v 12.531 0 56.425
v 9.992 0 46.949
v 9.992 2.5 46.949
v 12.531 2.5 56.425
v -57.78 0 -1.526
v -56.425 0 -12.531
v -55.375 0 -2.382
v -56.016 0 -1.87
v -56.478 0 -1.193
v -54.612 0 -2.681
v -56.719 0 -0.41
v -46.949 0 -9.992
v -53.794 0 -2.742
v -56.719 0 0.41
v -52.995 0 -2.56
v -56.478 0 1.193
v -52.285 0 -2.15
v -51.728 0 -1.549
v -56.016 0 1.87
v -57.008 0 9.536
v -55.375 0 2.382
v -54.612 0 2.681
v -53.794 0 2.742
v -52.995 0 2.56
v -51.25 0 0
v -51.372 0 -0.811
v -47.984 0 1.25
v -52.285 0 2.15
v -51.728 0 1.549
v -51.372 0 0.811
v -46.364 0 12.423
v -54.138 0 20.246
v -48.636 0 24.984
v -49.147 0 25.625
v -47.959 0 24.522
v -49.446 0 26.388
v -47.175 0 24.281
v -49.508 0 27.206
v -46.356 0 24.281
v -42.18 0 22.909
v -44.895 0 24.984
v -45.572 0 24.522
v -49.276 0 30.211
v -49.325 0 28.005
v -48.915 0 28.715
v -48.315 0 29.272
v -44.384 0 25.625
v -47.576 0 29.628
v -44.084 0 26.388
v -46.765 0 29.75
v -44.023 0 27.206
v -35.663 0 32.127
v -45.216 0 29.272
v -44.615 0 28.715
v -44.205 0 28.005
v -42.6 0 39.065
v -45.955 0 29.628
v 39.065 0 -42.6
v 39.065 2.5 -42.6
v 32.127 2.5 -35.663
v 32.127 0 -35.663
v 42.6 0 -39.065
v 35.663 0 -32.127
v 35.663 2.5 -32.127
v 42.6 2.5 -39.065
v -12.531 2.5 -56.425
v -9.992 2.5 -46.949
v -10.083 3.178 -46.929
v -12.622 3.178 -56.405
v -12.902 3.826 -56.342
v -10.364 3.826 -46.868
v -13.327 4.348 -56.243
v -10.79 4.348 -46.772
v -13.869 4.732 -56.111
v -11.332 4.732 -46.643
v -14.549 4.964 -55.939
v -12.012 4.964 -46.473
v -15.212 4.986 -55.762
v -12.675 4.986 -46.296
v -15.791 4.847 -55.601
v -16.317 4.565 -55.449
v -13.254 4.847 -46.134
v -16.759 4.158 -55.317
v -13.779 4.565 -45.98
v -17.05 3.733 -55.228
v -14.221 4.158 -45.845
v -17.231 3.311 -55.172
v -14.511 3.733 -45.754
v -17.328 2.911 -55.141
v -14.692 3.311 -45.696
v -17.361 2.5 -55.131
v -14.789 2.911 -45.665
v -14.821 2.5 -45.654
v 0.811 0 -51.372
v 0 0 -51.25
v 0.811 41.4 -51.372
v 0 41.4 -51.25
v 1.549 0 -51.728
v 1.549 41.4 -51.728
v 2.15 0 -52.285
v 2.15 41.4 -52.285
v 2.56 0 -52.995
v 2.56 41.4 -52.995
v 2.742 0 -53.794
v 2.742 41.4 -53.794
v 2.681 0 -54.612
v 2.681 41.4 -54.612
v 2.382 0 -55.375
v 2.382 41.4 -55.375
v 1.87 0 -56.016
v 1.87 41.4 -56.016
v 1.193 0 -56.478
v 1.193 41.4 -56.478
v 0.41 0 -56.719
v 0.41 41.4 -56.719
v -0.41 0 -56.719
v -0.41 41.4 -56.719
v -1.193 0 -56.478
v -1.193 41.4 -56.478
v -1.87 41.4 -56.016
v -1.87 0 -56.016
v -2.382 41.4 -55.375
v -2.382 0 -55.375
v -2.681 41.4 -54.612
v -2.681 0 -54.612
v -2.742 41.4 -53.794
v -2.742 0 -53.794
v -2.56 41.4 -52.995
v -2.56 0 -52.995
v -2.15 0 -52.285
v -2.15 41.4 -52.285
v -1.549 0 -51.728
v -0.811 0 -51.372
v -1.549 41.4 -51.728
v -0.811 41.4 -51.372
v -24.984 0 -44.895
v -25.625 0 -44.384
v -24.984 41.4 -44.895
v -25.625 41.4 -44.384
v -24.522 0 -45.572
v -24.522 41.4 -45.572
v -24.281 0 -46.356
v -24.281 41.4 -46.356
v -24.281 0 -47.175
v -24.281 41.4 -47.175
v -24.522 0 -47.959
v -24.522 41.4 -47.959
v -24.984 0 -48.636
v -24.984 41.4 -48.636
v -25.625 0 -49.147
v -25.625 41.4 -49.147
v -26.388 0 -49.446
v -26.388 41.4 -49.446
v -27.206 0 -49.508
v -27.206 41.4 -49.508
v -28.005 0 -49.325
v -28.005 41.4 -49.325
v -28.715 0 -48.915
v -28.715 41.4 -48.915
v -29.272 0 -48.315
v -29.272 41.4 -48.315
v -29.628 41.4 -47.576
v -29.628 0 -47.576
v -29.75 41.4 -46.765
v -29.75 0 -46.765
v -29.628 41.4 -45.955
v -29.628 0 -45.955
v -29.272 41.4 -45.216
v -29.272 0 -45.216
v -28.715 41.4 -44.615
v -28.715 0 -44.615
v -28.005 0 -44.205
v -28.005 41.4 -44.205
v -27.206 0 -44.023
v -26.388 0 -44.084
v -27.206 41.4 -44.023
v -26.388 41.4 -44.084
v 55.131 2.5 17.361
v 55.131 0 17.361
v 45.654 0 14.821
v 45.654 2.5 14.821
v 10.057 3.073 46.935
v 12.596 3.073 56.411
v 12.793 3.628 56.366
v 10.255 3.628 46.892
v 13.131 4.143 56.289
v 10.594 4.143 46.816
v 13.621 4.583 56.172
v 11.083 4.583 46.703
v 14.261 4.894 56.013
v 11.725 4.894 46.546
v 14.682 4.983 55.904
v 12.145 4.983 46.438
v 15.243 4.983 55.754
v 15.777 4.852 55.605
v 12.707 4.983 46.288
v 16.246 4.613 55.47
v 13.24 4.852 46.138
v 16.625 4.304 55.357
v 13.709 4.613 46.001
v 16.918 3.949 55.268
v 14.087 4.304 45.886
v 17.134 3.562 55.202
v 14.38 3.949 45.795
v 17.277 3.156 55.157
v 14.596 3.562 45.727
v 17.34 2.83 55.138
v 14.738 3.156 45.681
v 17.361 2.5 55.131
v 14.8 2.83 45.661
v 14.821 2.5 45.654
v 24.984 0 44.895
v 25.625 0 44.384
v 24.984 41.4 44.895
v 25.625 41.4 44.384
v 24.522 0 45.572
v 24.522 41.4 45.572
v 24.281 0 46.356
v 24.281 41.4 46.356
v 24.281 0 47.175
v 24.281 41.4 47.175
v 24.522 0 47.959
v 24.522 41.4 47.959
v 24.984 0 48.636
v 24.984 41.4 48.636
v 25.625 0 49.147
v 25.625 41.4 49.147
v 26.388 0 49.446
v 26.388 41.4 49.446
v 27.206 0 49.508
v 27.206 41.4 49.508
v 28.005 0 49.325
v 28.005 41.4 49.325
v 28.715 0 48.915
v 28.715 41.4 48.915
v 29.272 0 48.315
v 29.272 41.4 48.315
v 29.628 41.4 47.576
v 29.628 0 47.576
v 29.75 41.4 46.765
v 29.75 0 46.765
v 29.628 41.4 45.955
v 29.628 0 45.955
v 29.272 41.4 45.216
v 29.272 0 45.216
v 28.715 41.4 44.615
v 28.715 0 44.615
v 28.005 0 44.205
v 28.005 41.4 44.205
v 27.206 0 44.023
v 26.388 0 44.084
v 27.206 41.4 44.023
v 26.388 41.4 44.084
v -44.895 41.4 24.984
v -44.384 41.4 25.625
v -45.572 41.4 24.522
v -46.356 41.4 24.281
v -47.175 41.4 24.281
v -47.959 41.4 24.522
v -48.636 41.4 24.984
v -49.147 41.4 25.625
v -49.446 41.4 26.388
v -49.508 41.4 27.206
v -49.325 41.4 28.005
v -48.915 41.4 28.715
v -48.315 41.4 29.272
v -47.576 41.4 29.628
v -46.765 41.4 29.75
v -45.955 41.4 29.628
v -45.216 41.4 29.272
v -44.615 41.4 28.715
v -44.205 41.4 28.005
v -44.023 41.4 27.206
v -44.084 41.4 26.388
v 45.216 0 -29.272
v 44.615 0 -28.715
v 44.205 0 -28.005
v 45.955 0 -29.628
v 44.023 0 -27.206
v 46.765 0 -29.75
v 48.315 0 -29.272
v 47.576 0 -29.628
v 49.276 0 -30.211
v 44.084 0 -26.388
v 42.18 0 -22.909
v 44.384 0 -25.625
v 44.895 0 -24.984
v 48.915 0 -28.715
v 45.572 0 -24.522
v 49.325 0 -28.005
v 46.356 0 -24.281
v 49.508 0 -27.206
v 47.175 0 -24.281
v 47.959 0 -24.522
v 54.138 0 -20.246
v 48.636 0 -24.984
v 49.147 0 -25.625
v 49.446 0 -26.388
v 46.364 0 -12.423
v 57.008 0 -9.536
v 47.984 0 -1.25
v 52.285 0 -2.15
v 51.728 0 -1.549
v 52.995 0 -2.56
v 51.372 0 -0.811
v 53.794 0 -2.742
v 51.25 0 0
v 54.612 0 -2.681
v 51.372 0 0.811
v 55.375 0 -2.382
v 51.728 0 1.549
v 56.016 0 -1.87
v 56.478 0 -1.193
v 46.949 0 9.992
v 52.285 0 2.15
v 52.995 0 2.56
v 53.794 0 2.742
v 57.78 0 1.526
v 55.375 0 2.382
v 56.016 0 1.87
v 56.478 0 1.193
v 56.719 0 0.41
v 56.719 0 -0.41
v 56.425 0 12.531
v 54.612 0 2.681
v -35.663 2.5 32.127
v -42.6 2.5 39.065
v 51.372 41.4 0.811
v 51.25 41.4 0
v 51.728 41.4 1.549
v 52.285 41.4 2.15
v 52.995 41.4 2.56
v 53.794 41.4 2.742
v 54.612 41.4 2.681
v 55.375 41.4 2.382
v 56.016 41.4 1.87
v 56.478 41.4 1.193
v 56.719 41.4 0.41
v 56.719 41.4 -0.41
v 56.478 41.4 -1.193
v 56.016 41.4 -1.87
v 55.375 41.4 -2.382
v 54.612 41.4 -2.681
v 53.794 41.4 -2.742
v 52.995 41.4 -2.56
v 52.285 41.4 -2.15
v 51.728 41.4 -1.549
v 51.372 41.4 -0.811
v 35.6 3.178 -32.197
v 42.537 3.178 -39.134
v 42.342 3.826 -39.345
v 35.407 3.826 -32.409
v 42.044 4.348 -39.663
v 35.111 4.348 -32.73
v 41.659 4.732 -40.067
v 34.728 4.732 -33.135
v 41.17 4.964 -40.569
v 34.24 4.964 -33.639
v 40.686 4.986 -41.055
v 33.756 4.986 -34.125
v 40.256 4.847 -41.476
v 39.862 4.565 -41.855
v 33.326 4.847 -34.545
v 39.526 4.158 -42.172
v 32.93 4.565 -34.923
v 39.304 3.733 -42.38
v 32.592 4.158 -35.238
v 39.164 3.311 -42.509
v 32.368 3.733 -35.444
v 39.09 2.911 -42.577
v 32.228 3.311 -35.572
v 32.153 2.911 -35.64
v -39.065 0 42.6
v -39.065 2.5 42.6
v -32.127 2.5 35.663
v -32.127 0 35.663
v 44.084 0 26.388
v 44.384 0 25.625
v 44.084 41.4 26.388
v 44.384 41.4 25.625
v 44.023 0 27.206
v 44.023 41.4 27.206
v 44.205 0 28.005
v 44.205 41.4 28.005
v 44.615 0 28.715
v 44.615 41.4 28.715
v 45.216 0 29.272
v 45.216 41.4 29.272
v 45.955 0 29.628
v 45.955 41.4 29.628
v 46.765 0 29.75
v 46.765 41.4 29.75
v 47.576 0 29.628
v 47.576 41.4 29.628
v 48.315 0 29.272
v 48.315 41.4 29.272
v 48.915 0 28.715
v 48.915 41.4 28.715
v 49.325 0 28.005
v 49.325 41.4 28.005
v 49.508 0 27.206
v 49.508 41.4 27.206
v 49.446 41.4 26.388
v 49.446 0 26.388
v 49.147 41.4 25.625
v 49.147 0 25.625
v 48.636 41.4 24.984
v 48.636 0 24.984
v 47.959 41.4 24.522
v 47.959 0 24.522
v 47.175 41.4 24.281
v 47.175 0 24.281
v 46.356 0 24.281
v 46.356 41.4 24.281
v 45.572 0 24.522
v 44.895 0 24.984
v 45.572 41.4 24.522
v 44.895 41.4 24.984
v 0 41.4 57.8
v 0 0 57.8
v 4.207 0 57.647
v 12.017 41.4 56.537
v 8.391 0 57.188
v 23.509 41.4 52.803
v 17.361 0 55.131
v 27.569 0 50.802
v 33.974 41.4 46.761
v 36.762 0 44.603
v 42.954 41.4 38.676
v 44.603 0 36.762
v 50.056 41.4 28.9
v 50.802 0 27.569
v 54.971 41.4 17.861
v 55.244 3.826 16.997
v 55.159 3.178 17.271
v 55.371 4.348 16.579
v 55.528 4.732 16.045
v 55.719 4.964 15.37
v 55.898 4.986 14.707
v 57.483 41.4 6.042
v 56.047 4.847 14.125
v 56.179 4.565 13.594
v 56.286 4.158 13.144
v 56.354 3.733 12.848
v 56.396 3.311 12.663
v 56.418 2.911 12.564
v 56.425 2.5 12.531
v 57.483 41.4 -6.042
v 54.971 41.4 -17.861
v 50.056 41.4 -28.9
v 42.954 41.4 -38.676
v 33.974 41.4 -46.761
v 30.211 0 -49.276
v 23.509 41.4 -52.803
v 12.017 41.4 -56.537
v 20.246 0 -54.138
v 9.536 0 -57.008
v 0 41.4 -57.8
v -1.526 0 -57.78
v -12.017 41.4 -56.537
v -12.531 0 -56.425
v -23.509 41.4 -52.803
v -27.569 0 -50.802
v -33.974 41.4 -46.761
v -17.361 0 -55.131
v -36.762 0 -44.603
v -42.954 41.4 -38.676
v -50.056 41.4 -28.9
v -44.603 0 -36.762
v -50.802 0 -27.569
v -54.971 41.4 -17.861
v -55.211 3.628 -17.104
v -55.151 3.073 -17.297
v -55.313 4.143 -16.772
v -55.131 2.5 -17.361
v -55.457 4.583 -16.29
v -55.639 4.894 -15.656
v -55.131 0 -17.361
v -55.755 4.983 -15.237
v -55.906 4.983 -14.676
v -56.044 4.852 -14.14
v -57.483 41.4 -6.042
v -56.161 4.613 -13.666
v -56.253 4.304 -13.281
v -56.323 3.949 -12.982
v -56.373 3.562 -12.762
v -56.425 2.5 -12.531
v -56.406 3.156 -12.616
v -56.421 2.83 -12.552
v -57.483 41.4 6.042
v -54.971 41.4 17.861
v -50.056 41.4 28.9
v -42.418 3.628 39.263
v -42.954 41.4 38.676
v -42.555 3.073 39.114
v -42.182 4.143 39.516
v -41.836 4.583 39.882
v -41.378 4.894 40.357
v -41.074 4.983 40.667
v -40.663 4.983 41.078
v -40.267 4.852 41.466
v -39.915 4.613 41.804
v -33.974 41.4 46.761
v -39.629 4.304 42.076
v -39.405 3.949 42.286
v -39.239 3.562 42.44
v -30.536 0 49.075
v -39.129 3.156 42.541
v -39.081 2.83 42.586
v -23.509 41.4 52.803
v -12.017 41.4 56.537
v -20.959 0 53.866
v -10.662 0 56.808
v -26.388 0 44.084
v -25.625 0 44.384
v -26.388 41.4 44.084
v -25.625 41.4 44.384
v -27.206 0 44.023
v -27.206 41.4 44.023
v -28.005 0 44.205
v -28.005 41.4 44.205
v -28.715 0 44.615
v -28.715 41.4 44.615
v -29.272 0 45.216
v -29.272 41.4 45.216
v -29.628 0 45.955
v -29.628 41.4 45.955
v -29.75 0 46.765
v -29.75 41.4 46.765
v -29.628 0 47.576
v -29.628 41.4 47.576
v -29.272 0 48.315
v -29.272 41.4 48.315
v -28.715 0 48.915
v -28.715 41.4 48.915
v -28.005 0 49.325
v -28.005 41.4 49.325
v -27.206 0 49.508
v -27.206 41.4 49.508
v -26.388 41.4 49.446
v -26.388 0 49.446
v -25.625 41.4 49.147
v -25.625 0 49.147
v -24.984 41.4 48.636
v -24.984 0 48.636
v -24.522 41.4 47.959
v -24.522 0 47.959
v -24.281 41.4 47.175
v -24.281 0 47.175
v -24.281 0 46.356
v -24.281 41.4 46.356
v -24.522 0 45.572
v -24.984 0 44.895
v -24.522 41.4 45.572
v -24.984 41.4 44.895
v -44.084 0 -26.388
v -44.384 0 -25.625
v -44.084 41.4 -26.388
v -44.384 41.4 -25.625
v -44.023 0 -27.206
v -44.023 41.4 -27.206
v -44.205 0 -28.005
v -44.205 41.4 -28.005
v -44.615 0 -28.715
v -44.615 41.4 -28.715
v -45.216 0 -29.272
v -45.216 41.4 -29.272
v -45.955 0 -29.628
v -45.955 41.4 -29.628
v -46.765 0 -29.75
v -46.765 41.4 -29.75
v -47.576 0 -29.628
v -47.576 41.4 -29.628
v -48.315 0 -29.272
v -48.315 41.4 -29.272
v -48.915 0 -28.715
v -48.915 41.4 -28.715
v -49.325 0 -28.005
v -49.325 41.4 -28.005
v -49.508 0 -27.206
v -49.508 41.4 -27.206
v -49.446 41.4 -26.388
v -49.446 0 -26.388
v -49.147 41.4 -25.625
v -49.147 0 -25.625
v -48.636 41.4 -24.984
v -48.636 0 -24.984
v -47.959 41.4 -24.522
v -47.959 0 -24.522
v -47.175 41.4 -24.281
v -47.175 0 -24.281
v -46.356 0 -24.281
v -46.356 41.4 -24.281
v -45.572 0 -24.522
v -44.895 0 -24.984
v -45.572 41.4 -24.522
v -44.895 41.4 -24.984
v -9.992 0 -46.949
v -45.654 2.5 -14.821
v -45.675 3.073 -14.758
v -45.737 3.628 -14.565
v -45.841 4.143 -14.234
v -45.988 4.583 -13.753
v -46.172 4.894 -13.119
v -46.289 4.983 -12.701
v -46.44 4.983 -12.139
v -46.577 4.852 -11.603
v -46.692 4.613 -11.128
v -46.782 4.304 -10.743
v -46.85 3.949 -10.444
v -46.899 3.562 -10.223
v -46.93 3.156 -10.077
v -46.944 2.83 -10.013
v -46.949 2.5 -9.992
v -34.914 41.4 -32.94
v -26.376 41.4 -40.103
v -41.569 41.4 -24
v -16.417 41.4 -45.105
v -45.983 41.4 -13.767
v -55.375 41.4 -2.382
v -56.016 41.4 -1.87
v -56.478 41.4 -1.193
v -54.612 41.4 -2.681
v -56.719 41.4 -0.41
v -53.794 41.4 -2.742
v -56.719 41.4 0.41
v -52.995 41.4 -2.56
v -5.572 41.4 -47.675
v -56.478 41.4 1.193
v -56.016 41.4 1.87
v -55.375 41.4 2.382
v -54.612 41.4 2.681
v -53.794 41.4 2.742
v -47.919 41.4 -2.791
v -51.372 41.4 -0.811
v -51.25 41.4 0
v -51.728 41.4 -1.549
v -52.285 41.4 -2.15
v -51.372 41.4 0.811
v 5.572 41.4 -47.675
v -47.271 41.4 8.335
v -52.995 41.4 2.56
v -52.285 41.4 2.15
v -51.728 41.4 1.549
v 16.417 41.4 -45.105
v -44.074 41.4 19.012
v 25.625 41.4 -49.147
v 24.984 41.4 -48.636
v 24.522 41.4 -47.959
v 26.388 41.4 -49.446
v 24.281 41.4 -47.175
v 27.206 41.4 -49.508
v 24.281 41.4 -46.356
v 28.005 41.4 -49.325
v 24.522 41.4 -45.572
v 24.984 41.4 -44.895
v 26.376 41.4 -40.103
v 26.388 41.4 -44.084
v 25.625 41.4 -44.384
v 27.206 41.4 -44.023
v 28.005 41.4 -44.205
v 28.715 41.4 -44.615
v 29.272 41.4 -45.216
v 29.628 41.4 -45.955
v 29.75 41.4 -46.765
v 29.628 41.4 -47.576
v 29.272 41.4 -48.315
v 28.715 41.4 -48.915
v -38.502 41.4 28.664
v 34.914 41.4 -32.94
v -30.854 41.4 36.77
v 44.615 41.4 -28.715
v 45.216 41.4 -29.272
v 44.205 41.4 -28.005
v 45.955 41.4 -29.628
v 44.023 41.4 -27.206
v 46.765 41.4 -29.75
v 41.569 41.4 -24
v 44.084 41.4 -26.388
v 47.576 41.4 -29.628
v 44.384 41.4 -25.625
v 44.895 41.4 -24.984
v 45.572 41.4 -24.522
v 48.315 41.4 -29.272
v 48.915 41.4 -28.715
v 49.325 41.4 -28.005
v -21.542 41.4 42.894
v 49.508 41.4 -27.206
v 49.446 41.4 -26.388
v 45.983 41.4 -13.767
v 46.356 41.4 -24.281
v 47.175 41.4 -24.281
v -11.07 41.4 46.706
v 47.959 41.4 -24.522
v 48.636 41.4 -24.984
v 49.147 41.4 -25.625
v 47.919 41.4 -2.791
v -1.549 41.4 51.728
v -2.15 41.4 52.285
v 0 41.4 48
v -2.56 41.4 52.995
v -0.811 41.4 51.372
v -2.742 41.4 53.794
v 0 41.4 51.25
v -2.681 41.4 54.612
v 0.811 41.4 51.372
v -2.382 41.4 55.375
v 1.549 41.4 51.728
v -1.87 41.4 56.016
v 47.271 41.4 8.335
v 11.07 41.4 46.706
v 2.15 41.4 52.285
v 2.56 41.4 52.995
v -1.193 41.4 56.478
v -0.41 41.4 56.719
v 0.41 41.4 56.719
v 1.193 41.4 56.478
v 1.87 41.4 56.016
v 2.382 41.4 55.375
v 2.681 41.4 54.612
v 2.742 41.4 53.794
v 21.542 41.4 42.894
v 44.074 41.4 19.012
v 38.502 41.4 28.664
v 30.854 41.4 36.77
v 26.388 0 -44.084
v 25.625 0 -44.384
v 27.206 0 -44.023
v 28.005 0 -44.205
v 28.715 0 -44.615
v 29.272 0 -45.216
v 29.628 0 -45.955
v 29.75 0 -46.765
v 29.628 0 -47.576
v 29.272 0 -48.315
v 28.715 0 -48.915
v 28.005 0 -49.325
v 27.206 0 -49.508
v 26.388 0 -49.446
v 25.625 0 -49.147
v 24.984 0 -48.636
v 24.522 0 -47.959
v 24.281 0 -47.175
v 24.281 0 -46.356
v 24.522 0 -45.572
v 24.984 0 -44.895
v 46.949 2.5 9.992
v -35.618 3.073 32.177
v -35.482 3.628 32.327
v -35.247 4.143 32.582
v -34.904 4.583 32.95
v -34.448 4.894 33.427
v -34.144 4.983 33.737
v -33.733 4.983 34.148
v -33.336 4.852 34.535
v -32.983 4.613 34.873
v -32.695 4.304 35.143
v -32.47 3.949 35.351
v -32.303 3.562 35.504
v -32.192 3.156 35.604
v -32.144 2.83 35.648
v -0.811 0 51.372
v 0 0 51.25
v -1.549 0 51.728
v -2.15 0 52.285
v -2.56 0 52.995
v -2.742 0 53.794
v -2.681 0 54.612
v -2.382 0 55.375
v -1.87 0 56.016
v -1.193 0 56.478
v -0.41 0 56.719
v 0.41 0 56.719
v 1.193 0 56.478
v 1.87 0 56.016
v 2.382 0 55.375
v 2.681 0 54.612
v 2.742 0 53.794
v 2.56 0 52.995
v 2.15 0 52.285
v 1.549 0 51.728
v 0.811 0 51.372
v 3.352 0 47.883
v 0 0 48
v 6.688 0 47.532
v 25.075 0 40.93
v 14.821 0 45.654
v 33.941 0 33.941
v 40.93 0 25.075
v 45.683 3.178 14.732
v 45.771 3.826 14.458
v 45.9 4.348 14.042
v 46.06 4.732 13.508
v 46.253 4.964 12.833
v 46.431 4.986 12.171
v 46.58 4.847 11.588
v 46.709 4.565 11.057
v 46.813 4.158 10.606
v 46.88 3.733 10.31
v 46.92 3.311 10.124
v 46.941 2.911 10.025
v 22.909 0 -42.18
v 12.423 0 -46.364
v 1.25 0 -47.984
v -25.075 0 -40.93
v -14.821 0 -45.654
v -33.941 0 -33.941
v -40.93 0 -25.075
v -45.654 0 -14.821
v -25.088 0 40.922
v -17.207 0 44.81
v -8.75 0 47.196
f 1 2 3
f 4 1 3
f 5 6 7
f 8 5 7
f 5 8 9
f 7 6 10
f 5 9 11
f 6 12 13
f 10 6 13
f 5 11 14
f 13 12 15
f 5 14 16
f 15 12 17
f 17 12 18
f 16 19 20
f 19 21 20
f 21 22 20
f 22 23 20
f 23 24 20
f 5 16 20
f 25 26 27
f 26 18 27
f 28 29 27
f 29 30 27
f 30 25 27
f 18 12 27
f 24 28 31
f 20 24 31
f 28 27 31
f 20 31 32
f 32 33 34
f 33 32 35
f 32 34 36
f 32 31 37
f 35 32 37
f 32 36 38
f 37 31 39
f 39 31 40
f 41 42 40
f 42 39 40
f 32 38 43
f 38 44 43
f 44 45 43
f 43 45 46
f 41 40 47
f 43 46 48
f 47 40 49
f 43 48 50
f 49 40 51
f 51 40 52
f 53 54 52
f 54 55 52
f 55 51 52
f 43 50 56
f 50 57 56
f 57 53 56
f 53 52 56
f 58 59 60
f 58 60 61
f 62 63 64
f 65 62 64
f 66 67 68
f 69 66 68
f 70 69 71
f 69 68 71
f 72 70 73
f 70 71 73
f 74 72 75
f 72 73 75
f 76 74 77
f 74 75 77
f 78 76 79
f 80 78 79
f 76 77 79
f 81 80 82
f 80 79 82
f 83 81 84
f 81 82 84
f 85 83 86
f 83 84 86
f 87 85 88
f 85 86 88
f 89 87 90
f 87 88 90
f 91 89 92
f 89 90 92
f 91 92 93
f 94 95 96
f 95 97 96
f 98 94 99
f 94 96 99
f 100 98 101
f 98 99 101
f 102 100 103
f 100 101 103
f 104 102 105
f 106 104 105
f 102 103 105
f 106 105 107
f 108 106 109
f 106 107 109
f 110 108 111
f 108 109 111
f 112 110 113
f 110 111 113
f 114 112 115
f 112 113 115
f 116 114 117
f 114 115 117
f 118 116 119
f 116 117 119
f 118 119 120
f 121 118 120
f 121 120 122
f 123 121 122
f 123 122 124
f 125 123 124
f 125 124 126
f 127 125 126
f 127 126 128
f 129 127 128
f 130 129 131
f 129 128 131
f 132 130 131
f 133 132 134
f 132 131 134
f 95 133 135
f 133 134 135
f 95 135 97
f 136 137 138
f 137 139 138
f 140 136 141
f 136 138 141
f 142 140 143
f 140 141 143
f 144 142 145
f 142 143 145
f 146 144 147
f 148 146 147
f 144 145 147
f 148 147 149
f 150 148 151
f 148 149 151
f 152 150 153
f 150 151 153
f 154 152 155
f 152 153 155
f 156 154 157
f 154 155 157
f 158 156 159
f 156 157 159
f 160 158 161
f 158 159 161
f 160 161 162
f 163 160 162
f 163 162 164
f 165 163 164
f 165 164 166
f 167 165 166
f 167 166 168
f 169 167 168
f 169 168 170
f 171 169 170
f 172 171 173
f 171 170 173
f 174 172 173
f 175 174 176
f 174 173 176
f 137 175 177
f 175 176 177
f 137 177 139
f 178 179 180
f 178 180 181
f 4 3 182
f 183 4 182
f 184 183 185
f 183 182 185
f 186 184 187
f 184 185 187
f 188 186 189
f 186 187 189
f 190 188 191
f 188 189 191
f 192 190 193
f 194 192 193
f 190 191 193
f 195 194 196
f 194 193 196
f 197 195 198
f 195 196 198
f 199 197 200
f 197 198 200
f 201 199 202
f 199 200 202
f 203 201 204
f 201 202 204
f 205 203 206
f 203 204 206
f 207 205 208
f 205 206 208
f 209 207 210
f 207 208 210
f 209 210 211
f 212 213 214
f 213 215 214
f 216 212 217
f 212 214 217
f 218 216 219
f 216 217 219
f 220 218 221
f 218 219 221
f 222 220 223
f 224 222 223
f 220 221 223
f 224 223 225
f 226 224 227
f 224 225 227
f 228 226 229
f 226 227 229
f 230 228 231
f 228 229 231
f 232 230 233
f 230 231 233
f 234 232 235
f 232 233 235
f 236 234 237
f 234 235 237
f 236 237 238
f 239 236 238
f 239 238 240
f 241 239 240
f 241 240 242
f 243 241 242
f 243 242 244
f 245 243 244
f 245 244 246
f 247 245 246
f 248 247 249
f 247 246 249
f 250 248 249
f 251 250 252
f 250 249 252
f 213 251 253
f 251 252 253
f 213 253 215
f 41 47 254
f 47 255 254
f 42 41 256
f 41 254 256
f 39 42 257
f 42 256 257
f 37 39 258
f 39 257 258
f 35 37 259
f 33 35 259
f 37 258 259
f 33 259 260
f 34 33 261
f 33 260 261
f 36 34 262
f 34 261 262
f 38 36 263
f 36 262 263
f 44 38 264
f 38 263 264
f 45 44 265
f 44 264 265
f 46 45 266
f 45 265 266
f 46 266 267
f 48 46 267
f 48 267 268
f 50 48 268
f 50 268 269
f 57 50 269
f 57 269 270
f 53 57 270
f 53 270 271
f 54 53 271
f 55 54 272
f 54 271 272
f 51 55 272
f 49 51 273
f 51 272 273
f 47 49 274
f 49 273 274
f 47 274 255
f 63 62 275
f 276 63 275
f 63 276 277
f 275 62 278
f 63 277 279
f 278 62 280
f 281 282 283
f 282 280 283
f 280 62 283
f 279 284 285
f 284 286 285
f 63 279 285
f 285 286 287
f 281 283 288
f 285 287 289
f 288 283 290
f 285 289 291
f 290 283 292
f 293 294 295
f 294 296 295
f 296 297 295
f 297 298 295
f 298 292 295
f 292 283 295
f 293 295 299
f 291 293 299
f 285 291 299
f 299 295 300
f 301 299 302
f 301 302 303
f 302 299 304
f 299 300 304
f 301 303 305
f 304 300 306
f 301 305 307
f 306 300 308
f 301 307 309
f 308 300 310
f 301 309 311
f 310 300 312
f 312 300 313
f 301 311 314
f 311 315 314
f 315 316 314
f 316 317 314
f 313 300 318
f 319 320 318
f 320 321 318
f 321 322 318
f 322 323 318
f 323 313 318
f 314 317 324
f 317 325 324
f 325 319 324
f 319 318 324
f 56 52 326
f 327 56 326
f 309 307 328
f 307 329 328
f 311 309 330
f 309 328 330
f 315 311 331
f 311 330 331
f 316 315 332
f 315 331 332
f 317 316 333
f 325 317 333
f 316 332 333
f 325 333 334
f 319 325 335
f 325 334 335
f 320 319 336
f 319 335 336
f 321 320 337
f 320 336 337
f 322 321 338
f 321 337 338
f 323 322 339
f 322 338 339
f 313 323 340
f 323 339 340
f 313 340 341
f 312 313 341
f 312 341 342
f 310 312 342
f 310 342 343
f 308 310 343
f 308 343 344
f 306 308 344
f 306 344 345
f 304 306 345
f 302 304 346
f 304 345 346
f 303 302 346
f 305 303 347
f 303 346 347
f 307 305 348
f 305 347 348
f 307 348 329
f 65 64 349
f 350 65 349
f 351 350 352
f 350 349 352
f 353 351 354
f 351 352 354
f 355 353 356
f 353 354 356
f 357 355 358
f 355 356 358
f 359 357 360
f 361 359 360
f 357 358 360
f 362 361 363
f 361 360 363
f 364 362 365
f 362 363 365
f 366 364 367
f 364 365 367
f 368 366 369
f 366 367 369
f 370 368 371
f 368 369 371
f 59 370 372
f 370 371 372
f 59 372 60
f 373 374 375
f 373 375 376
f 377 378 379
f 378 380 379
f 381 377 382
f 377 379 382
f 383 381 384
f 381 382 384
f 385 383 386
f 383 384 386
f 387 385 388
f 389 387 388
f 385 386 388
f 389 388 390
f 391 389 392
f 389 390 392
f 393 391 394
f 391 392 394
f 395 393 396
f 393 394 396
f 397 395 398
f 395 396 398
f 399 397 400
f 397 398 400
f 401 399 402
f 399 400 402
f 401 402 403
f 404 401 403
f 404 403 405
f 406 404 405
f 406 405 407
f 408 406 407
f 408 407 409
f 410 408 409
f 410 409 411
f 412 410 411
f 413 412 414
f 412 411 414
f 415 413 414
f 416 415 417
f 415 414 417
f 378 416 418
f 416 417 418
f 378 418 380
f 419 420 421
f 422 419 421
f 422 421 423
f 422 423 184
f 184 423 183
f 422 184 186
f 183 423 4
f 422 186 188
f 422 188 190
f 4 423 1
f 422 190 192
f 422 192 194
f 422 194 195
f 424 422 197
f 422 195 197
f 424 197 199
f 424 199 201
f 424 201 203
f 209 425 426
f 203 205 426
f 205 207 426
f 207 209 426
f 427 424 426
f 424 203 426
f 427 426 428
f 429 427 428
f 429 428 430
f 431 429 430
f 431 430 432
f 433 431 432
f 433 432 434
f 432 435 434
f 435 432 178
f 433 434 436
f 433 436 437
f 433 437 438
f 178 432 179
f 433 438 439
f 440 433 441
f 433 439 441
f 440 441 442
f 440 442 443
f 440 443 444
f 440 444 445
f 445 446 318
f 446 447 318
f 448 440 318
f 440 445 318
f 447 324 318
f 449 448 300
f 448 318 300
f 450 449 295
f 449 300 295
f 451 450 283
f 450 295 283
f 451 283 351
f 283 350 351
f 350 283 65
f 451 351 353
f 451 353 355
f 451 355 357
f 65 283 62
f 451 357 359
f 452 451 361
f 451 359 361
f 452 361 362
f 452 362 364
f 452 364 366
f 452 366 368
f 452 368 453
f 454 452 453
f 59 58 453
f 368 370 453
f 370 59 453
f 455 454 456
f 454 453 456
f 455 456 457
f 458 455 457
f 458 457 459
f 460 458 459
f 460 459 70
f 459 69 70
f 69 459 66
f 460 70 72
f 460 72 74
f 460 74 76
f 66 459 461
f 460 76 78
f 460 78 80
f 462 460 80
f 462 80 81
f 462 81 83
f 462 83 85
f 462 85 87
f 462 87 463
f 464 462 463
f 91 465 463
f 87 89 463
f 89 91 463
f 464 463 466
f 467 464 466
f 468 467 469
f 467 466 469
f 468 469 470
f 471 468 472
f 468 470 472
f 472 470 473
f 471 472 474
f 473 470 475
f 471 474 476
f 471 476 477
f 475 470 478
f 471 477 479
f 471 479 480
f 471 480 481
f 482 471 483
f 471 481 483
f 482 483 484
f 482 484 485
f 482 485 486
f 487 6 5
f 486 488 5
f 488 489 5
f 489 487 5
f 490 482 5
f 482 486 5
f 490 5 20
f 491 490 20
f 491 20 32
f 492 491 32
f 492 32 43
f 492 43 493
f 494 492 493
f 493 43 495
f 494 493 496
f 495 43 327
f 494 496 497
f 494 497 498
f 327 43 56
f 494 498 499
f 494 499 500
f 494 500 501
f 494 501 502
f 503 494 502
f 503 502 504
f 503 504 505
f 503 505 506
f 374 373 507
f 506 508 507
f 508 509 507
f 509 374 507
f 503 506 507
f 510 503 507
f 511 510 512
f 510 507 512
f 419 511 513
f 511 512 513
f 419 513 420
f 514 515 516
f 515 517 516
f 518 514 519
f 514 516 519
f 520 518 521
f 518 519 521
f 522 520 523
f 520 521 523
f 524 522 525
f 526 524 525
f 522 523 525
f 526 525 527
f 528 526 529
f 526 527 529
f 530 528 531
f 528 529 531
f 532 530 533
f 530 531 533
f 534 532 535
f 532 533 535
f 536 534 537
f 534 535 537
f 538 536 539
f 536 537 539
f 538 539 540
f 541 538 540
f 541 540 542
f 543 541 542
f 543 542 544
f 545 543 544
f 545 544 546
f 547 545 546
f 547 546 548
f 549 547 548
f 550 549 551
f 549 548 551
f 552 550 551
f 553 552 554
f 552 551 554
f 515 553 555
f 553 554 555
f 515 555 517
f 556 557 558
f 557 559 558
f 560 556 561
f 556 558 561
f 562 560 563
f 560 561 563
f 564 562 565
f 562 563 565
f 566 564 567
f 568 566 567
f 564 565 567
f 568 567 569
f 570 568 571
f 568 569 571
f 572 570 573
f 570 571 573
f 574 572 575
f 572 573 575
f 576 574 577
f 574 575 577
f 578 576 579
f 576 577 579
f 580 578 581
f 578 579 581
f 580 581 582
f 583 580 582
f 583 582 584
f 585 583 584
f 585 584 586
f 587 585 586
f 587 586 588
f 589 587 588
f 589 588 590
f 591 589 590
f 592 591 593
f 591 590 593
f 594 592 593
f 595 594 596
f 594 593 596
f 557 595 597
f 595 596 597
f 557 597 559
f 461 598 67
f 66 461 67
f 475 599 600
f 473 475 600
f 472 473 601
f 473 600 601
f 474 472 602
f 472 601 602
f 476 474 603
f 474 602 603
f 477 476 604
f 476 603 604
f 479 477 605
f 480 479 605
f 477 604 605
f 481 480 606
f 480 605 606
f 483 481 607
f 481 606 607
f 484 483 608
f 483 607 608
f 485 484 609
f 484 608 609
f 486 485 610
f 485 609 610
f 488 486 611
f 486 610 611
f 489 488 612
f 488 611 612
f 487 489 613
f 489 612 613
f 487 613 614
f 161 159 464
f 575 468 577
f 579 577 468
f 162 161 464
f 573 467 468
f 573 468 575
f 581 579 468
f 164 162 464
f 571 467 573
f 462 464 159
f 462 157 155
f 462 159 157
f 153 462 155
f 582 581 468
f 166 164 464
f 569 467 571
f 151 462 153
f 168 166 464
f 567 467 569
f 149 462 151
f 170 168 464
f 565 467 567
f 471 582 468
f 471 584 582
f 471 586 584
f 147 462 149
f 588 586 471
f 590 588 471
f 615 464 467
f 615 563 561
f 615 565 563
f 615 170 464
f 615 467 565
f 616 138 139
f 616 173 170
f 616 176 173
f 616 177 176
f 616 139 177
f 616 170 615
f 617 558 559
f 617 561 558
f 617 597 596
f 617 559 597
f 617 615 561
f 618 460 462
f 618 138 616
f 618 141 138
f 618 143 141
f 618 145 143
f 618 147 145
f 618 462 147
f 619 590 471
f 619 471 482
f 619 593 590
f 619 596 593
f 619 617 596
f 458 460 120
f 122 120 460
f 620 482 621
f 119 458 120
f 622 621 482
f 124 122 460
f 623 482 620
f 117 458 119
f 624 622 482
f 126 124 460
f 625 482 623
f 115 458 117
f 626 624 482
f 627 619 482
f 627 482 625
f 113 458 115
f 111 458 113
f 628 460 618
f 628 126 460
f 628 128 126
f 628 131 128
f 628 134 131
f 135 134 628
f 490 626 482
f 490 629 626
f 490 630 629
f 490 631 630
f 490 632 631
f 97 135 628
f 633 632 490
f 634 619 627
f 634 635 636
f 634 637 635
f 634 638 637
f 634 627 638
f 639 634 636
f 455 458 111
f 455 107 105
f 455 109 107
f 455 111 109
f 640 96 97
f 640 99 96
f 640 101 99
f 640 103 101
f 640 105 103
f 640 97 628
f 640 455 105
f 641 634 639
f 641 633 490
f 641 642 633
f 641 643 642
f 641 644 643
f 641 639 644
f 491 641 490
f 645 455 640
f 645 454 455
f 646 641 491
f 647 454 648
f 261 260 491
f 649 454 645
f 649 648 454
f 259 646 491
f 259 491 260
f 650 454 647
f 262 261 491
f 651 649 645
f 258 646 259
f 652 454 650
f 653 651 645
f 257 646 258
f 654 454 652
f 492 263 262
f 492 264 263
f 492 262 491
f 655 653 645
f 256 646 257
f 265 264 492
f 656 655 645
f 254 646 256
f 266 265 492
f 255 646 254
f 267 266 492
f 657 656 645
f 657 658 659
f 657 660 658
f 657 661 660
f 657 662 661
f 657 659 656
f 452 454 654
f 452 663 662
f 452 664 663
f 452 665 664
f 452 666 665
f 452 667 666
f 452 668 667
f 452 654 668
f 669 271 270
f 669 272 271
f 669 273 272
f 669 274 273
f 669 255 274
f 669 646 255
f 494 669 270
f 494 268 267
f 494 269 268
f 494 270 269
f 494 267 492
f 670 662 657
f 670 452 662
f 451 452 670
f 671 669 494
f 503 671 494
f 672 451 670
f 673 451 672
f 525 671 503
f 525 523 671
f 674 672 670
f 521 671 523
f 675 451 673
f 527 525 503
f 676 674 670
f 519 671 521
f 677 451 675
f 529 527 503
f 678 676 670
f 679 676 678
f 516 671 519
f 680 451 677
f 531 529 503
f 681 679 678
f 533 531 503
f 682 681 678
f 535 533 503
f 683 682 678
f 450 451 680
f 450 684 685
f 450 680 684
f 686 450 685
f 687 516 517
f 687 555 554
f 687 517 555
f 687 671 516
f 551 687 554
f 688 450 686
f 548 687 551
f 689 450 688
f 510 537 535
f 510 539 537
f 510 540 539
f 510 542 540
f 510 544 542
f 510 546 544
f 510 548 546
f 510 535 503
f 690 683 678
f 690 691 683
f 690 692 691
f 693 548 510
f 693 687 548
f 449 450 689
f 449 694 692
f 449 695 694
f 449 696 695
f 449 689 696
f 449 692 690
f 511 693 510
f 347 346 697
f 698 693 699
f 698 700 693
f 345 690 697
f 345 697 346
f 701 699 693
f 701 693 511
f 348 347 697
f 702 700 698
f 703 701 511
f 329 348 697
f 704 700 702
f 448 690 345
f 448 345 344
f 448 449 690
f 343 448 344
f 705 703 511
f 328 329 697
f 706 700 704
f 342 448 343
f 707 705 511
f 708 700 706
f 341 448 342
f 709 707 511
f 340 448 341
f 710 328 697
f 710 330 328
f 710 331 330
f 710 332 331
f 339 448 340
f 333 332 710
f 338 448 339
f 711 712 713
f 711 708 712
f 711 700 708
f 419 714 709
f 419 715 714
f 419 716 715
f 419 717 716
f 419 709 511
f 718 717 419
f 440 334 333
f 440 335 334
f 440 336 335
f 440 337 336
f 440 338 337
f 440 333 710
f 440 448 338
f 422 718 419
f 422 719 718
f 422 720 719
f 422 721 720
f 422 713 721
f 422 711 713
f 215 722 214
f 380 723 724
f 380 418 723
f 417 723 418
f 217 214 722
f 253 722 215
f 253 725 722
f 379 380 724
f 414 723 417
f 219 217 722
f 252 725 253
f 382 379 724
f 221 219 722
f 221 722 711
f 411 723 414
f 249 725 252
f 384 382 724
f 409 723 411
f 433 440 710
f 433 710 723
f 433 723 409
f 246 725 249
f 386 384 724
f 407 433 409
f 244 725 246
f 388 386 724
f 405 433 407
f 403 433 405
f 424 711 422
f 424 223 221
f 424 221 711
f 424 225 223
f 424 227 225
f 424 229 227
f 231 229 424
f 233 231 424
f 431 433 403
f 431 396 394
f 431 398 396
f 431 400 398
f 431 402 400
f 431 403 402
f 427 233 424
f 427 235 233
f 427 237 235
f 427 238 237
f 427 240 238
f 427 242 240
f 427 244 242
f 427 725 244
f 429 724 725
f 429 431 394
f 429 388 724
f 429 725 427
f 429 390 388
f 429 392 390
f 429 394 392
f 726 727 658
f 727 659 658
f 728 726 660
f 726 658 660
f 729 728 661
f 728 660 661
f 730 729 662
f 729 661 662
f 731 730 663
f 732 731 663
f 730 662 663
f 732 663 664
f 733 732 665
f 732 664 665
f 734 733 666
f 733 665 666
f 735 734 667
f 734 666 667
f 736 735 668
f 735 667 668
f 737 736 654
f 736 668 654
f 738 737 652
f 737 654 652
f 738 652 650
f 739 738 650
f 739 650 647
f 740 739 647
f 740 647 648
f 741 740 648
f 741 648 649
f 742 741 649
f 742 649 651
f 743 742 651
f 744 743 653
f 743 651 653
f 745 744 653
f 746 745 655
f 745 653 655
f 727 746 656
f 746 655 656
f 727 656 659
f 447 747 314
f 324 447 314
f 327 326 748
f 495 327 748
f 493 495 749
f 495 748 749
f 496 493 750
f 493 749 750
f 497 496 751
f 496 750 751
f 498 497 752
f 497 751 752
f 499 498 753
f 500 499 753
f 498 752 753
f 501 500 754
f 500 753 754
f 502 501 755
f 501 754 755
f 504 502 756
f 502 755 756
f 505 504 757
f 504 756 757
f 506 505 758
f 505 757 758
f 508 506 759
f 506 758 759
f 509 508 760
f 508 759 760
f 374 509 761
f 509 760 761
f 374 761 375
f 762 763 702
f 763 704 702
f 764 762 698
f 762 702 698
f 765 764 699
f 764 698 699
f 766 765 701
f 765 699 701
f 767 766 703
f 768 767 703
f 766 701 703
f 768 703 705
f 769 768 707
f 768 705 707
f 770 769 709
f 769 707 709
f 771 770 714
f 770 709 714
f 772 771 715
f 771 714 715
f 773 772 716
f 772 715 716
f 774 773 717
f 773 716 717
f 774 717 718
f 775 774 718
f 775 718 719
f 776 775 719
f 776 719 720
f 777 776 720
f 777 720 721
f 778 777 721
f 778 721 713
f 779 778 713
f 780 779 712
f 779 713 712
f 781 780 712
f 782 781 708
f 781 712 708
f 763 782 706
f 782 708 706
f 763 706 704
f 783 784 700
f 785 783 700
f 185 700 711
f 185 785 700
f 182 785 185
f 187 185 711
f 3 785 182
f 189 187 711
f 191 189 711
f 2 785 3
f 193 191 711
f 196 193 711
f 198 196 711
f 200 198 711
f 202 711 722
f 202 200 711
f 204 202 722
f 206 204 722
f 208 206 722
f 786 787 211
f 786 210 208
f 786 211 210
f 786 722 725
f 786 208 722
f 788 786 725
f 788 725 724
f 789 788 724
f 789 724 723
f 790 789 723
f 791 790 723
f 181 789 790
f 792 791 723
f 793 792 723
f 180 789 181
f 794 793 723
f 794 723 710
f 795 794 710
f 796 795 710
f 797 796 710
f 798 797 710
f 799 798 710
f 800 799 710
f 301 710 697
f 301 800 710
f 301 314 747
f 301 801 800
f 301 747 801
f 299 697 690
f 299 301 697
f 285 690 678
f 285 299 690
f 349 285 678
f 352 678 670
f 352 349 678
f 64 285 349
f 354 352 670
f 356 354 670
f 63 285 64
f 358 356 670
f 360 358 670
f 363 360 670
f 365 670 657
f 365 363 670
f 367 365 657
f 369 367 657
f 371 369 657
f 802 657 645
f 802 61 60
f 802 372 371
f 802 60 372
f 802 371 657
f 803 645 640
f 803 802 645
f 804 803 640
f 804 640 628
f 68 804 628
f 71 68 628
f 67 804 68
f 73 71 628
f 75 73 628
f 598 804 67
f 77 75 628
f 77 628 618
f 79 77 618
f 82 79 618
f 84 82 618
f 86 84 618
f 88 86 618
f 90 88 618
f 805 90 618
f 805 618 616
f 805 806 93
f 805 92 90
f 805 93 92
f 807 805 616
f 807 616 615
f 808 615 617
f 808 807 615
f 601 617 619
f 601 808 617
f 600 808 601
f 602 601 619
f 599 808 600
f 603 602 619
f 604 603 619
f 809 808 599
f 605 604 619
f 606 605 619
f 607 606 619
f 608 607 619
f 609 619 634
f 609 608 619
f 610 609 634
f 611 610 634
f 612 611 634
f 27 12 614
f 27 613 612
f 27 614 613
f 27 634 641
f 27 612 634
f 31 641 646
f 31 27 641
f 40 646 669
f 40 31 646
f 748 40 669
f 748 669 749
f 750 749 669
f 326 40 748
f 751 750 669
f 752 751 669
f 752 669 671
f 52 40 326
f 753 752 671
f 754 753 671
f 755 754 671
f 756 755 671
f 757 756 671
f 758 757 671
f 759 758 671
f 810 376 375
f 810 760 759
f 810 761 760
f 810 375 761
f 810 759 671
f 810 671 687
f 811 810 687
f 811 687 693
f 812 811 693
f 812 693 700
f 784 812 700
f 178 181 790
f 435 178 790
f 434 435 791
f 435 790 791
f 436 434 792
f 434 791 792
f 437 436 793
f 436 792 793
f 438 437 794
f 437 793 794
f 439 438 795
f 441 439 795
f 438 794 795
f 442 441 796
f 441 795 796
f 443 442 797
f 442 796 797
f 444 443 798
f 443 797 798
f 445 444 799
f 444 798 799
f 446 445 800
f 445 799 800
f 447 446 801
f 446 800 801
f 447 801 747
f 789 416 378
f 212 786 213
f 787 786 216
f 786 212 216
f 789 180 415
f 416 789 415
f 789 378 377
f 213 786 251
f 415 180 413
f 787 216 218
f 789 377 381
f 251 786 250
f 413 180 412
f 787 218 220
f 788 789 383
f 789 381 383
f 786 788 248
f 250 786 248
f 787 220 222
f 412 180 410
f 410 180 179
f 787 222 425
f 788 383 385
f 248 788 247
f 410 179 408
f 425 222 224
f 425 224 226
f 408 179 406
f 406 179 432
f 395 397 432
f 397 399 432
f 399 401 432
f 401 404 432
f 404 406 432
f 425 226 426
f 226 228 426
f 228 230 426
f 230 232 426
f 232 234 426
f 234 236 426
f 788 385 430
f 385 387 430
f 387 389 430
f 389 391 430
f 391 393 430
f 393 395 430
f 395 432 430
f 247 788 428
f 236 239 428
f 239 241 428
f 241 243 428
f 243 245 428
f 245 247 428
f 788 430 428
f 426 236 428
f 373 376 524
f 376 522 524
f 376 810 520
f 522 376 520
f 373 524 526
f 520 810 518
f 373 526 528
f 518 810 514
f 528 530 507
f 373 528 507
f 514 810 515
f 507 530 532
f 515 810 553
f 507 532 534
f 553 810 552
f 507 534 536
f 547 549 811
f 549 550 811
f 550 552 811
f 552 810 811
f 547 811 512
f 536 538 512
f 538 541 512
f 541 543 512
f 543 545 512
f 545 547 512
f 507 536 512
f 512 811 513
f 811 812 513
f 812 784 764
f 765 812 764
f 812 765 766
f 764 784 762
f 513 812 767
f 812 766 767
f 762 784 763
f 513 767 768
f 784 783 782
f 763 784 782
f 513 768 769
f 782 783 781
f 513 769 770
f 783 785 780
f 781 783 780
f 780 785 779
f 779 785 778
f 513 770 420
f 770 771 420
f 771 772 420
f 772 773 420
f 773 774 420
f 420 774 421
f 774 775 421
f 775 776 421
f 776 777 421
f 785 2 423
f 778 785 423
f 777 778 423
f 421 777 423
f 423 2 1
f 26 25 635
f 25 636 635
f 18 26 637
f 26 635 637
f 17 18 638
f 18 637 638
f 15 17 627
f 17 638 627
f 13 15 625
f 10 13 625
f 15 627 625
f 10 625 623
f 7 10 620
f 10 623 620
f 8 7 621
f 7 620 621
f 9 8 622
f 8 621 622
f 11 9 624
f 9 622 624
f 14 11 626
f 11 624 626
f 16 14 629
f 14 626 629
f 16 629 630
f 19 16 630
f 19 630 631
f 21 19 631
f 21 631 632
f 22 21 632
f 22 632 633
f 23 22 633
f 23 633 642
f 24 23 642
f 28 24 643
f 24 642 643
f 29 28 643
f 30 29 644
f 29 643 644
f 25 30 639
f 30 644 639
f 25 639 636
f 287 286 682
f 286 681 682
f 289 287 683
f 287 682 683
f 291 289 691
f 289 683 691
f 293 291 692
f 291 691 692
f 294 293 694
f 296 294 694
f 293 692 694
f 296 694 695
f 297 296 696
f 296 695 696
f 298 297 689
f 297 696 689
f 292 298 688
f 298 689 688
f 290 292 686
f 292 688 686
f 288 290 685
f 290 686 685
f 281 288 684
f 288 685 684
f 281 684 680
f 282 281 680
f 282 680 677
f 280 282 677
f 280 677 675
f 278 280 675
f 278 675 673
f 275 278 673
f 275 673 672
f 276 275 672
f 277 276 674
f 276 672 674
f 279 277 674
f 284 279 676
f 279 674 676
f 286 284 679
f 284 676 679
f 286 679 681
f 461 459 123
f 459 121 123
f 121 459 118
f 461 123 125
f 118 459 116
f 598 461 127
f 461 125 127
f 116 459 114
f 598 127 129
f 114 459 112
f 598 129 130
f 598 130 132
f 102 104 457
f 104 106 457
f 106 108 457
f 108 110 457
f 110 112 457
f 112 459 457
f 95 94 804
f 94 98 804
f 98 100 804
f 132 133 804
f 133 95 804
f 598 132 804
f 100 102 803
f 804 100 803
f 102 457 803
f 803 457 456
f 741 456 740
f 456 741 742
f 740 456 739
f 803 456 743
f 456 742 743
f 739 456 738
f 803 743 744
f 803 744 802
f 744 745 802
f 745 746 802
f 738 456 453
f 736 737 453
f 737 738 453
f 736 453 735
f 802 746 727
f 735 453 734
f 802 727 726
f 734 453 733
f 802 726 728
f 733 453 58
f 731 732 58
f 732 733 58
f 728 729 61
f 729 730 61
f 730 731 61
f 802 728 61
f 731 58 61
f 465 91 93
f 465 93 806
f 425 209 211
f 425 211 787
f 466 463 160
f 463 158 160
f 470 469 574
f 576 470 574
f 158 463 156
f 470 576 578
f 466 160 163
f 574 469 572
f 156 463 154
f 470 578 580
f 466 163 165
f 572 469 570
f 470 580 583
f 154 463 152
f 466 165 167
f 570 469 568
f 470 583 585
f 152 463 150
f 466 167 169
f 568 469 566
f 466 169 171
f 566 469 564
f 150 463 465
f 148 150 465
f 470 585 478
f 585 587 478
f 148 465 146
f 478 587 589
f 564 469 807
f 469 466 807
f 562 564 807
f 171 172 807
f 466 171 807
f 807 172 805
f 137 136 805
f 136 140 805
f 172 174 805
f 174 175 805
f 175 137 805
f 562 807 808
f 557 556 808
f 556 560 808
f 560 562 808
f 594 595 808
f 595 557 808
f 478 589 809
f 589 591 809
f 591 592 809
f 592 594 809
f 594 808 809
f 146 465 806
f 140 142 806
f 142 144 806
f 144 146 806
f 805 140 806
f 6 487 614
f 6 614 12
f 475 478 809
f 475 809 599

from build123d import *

# Parameters (mm, degrees)
SKETCH_1_R               = 57.8
SKETCH_1_R_2             = 48
EXTRUDE_1_DEPTH          = 41.4
SKETCH_2_R               = 2.75
CUT_EXTRUDE_1_DEPTH      = 92.627725062
PATTERN_CIRCULAR_1_COUNT = 12
SKETCH_3_R               = 2.5
CUT_EXTRUDE_2_DEPTH      = 92.627725062
PATTERN_CIRCULAR_2_COUNT = 6


with BuildPart() as part:
    # 草图1 → 凸台-拉伸1 (new body)
    with BuildSketch(Plane(origin=(0, 0, 0), x_dir=(1, 0, 0), z_dir=(0, 1, 0))):
        with Locations(Location((0, 0, 0), (0, 0, 270))):
            Circle(SKETCH_1_R)
        with Locations(Location((0, 0, 0), (0, 0, 270))):
            Circle(SKETCH_1_R_2, mode=Mode.SUBTRACT)
    extrude(amount=EXTRUDE_1_DEPTH)

    # 草图2 → 切除-拉伸1 (cut, symmetric)
    with BuildSketch(Plane(origin=(0, 41.4, 0), x_dir=(1, 0, 0), z_dir=(0, 1, 0))):
        with Locations(Location((0, 54, 0), (0, 0, 270))):
            Circle(SKETCH_2_R)
    cut_extrude_1 = extrude(amount=CUT_EXTRUDE_1_DEPTH, both=True, mode=Mode.SUBTRACT)

    # 阵列(圆周)1: 切除-拉伸1 ×12 about axis
    pattern_circular_1_axis = Axis((0, 0, 0), (0, 1, 0))
    for i in range(1, PATTERN_CIRCULAR_1_COUNT):
        add(cut_extrude_1.rotate(pattern_circular_1_axis, i * 360 / PATTERN_CIRCULAR_1_COUNT), mode=Mode.SUBTRACT)

    # 草图3 → 切除-拉伸2 (cut, through all)
    with BuildSketch(Plane(origin=(0, 0, 0), x_dir=(0.7071067811865477, 0, 0.7071067811865475), z_dir=(-0.7071067811865475, 0, 0.7071067811865477))):
        with Locations((0, 2.5)):
            Circle(SKETCH_3_R)
        with BuildLine():
            Line((2.5, 0), (2.5, 2.5))
            ThreePointArc((2.5, 2.5), (1.767766953, 0.732233047), (0, 0))
            Line((0, 0), (2.5, 0))
        make_face()
        with BuildLine():
            ThreePointArc((0, 0), (-1.767766953, 0.732233047), (-2.5, 2.5))
            Line((-2.5, 2.5), (-2.5, 0))
            Line((-2.5, 0), (0, 0))
        make_face()
    cut_extrude_2 = extrude(amount=-CUT_EXTRUDE_2_DEPTH, mode=Mode.SUBTRACT)

    # 阵列(圆周)2: 切除-拉伸2 ×6 about axis
    pattern_circular_2_axis = Axis((0, 0, 0), (0, 1, 0))
    for i in range(1, PATTERN_CIRCULAR_2_COUNT):
        add(cut_extrude_2.rotate(pattern_circular_2_axis, i * 360 / PATTERN_CIRCULAR_2_COUNT), mode=Mode.SUBTRACT)


solid = part.part
